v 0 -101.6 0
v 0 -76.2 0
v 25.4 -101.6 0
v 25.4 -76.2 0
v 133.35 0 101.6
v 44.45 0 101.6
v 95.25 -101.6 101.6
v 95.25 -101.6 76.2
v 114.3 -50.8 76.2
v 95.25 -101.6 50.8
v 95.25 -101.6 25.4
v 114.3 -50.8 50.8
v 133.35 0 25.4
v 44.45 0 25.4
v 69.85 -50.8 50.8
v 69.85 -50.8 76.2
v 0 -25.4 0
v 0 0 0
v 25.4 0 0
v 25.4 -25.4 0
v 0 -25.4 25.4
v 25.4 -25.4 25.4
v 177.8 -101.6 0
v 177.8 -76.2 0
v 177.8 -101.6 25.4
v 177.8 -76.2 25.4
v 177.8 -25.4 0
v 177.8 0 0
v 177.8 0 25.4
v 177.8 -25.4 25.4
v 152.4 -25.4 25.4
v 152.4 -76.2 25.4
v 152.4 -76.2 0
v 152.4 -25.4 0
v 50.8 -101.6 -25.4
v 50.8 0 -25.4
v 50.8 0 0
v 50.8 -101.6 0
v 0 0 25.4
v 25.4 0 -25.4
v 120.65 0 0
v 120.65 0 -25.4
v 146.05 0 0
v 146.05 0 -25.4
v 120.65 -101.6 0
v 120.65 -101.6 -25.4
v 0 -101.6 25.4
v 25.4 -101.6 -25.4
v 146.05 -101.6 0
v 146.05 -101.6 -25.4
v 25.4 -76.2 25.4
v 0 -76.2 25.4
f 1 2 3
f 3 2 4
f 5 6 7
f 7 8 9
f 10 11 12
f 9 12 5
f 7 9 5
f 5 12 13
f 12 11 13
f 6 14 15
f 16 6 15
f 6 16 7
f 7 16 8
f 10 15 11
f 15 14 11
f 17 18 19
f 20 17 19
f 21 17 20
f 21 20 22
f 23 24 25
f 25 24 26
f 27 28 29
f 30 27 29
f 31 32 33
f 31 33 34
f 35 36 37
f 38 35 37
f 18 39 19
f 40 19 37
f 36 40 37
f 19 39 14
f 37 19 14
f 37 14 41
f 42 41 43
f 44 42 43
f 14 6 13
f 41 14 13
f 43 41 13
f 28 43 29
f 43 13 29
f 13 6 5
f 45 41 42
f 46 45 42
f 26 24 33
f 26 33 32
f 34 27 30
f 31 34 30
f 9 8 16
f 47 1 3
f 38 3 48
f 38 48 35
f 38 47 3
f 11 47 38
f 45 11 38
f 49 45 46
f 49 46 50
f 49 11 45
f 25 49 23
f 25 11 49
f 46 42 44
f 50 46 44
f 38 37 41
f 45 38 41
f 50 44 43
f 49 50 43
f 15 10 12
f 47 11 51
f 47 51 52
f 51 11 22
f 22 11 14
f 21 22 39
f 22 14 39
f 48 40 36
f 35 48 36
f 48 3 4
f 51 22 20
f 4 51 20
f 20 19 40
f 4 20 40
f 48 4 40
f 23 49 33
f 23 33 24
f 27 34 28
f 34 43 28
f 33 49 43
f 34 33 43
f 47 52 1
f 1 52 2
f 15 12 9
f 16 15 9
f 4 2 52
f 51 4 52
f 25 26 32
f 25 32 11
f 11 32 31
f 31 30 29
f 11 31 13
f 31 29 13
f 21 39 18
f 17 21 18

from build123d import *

# Parameters (mm, degrees)
F1_DEPTH = 101.6
F2_W     = 50.8
F2_H     = 25.4
F3_DEPTH = 25.4
F4_W     = 50.8
F4_H     = 25.4
F5_DEPTH = 25.4
F7_DEPTH = 76.2
F8_W     = 50.8
F8_H     = 25.4
F9_DEPTH = 254


with BuildPart() as f1:
    # F0 (on Front) → F1 (new body)
    with BuildSketch(Plane.XZ):
        Polygon((0, 25.4), (0, 0), (25.4, 0), (25.4, -25.4), (50.8, -25.4), (50.8, 0), (120.65, 0), (120.65, -25.4), (146.05, -25.4), (146.05, 0), (171.45, 0), (177.8, 0), (177.8, 25.4), align=None)
    extrude(amount=F1_DEPTH)

    # F2 (on face) → F3 (cut)
    with BuildSketch(Plane.YZ.offset(177.8)):
        with Locations((-50.8, 12.7)):
            Rectangle(F2_W, F2_H)
    extrude(amount=-F3_DEPTH, mode=Mode.SUBTRACT)

    # F4 (on face) → F5 (cut)
    with BuildSketch(Plane(origin=(0, 0, 0), x_dir=(0, -1, 0), z_dir=(-1, 0, 0))):
        with Locations((50.8, 12.7)):
            Rectangle(F4_W, F4_H)
    extrude(amount=-F5_DEPTH, mode=Mode.SUBTRACT)

    # F6 (on face) → F7 (join)
    with BuildSketch(Plane.XY.offset(25.4)):
        Polygon((44.45, 0), (95.25, -101.6), (133.35, 0), align=None)
    extrude(amount=F7_DEPTH)

    # F8 (on Right) → F9 (cut)
    with BuildSketch(Plane.YZ):
        with Locations((-76.2, 63.5)):
            Rectangle(F8_W, F8_H)
    extrude(amount=F9_DEPTH, mode=Mode.SUBTRACT)


solid = f1.part
